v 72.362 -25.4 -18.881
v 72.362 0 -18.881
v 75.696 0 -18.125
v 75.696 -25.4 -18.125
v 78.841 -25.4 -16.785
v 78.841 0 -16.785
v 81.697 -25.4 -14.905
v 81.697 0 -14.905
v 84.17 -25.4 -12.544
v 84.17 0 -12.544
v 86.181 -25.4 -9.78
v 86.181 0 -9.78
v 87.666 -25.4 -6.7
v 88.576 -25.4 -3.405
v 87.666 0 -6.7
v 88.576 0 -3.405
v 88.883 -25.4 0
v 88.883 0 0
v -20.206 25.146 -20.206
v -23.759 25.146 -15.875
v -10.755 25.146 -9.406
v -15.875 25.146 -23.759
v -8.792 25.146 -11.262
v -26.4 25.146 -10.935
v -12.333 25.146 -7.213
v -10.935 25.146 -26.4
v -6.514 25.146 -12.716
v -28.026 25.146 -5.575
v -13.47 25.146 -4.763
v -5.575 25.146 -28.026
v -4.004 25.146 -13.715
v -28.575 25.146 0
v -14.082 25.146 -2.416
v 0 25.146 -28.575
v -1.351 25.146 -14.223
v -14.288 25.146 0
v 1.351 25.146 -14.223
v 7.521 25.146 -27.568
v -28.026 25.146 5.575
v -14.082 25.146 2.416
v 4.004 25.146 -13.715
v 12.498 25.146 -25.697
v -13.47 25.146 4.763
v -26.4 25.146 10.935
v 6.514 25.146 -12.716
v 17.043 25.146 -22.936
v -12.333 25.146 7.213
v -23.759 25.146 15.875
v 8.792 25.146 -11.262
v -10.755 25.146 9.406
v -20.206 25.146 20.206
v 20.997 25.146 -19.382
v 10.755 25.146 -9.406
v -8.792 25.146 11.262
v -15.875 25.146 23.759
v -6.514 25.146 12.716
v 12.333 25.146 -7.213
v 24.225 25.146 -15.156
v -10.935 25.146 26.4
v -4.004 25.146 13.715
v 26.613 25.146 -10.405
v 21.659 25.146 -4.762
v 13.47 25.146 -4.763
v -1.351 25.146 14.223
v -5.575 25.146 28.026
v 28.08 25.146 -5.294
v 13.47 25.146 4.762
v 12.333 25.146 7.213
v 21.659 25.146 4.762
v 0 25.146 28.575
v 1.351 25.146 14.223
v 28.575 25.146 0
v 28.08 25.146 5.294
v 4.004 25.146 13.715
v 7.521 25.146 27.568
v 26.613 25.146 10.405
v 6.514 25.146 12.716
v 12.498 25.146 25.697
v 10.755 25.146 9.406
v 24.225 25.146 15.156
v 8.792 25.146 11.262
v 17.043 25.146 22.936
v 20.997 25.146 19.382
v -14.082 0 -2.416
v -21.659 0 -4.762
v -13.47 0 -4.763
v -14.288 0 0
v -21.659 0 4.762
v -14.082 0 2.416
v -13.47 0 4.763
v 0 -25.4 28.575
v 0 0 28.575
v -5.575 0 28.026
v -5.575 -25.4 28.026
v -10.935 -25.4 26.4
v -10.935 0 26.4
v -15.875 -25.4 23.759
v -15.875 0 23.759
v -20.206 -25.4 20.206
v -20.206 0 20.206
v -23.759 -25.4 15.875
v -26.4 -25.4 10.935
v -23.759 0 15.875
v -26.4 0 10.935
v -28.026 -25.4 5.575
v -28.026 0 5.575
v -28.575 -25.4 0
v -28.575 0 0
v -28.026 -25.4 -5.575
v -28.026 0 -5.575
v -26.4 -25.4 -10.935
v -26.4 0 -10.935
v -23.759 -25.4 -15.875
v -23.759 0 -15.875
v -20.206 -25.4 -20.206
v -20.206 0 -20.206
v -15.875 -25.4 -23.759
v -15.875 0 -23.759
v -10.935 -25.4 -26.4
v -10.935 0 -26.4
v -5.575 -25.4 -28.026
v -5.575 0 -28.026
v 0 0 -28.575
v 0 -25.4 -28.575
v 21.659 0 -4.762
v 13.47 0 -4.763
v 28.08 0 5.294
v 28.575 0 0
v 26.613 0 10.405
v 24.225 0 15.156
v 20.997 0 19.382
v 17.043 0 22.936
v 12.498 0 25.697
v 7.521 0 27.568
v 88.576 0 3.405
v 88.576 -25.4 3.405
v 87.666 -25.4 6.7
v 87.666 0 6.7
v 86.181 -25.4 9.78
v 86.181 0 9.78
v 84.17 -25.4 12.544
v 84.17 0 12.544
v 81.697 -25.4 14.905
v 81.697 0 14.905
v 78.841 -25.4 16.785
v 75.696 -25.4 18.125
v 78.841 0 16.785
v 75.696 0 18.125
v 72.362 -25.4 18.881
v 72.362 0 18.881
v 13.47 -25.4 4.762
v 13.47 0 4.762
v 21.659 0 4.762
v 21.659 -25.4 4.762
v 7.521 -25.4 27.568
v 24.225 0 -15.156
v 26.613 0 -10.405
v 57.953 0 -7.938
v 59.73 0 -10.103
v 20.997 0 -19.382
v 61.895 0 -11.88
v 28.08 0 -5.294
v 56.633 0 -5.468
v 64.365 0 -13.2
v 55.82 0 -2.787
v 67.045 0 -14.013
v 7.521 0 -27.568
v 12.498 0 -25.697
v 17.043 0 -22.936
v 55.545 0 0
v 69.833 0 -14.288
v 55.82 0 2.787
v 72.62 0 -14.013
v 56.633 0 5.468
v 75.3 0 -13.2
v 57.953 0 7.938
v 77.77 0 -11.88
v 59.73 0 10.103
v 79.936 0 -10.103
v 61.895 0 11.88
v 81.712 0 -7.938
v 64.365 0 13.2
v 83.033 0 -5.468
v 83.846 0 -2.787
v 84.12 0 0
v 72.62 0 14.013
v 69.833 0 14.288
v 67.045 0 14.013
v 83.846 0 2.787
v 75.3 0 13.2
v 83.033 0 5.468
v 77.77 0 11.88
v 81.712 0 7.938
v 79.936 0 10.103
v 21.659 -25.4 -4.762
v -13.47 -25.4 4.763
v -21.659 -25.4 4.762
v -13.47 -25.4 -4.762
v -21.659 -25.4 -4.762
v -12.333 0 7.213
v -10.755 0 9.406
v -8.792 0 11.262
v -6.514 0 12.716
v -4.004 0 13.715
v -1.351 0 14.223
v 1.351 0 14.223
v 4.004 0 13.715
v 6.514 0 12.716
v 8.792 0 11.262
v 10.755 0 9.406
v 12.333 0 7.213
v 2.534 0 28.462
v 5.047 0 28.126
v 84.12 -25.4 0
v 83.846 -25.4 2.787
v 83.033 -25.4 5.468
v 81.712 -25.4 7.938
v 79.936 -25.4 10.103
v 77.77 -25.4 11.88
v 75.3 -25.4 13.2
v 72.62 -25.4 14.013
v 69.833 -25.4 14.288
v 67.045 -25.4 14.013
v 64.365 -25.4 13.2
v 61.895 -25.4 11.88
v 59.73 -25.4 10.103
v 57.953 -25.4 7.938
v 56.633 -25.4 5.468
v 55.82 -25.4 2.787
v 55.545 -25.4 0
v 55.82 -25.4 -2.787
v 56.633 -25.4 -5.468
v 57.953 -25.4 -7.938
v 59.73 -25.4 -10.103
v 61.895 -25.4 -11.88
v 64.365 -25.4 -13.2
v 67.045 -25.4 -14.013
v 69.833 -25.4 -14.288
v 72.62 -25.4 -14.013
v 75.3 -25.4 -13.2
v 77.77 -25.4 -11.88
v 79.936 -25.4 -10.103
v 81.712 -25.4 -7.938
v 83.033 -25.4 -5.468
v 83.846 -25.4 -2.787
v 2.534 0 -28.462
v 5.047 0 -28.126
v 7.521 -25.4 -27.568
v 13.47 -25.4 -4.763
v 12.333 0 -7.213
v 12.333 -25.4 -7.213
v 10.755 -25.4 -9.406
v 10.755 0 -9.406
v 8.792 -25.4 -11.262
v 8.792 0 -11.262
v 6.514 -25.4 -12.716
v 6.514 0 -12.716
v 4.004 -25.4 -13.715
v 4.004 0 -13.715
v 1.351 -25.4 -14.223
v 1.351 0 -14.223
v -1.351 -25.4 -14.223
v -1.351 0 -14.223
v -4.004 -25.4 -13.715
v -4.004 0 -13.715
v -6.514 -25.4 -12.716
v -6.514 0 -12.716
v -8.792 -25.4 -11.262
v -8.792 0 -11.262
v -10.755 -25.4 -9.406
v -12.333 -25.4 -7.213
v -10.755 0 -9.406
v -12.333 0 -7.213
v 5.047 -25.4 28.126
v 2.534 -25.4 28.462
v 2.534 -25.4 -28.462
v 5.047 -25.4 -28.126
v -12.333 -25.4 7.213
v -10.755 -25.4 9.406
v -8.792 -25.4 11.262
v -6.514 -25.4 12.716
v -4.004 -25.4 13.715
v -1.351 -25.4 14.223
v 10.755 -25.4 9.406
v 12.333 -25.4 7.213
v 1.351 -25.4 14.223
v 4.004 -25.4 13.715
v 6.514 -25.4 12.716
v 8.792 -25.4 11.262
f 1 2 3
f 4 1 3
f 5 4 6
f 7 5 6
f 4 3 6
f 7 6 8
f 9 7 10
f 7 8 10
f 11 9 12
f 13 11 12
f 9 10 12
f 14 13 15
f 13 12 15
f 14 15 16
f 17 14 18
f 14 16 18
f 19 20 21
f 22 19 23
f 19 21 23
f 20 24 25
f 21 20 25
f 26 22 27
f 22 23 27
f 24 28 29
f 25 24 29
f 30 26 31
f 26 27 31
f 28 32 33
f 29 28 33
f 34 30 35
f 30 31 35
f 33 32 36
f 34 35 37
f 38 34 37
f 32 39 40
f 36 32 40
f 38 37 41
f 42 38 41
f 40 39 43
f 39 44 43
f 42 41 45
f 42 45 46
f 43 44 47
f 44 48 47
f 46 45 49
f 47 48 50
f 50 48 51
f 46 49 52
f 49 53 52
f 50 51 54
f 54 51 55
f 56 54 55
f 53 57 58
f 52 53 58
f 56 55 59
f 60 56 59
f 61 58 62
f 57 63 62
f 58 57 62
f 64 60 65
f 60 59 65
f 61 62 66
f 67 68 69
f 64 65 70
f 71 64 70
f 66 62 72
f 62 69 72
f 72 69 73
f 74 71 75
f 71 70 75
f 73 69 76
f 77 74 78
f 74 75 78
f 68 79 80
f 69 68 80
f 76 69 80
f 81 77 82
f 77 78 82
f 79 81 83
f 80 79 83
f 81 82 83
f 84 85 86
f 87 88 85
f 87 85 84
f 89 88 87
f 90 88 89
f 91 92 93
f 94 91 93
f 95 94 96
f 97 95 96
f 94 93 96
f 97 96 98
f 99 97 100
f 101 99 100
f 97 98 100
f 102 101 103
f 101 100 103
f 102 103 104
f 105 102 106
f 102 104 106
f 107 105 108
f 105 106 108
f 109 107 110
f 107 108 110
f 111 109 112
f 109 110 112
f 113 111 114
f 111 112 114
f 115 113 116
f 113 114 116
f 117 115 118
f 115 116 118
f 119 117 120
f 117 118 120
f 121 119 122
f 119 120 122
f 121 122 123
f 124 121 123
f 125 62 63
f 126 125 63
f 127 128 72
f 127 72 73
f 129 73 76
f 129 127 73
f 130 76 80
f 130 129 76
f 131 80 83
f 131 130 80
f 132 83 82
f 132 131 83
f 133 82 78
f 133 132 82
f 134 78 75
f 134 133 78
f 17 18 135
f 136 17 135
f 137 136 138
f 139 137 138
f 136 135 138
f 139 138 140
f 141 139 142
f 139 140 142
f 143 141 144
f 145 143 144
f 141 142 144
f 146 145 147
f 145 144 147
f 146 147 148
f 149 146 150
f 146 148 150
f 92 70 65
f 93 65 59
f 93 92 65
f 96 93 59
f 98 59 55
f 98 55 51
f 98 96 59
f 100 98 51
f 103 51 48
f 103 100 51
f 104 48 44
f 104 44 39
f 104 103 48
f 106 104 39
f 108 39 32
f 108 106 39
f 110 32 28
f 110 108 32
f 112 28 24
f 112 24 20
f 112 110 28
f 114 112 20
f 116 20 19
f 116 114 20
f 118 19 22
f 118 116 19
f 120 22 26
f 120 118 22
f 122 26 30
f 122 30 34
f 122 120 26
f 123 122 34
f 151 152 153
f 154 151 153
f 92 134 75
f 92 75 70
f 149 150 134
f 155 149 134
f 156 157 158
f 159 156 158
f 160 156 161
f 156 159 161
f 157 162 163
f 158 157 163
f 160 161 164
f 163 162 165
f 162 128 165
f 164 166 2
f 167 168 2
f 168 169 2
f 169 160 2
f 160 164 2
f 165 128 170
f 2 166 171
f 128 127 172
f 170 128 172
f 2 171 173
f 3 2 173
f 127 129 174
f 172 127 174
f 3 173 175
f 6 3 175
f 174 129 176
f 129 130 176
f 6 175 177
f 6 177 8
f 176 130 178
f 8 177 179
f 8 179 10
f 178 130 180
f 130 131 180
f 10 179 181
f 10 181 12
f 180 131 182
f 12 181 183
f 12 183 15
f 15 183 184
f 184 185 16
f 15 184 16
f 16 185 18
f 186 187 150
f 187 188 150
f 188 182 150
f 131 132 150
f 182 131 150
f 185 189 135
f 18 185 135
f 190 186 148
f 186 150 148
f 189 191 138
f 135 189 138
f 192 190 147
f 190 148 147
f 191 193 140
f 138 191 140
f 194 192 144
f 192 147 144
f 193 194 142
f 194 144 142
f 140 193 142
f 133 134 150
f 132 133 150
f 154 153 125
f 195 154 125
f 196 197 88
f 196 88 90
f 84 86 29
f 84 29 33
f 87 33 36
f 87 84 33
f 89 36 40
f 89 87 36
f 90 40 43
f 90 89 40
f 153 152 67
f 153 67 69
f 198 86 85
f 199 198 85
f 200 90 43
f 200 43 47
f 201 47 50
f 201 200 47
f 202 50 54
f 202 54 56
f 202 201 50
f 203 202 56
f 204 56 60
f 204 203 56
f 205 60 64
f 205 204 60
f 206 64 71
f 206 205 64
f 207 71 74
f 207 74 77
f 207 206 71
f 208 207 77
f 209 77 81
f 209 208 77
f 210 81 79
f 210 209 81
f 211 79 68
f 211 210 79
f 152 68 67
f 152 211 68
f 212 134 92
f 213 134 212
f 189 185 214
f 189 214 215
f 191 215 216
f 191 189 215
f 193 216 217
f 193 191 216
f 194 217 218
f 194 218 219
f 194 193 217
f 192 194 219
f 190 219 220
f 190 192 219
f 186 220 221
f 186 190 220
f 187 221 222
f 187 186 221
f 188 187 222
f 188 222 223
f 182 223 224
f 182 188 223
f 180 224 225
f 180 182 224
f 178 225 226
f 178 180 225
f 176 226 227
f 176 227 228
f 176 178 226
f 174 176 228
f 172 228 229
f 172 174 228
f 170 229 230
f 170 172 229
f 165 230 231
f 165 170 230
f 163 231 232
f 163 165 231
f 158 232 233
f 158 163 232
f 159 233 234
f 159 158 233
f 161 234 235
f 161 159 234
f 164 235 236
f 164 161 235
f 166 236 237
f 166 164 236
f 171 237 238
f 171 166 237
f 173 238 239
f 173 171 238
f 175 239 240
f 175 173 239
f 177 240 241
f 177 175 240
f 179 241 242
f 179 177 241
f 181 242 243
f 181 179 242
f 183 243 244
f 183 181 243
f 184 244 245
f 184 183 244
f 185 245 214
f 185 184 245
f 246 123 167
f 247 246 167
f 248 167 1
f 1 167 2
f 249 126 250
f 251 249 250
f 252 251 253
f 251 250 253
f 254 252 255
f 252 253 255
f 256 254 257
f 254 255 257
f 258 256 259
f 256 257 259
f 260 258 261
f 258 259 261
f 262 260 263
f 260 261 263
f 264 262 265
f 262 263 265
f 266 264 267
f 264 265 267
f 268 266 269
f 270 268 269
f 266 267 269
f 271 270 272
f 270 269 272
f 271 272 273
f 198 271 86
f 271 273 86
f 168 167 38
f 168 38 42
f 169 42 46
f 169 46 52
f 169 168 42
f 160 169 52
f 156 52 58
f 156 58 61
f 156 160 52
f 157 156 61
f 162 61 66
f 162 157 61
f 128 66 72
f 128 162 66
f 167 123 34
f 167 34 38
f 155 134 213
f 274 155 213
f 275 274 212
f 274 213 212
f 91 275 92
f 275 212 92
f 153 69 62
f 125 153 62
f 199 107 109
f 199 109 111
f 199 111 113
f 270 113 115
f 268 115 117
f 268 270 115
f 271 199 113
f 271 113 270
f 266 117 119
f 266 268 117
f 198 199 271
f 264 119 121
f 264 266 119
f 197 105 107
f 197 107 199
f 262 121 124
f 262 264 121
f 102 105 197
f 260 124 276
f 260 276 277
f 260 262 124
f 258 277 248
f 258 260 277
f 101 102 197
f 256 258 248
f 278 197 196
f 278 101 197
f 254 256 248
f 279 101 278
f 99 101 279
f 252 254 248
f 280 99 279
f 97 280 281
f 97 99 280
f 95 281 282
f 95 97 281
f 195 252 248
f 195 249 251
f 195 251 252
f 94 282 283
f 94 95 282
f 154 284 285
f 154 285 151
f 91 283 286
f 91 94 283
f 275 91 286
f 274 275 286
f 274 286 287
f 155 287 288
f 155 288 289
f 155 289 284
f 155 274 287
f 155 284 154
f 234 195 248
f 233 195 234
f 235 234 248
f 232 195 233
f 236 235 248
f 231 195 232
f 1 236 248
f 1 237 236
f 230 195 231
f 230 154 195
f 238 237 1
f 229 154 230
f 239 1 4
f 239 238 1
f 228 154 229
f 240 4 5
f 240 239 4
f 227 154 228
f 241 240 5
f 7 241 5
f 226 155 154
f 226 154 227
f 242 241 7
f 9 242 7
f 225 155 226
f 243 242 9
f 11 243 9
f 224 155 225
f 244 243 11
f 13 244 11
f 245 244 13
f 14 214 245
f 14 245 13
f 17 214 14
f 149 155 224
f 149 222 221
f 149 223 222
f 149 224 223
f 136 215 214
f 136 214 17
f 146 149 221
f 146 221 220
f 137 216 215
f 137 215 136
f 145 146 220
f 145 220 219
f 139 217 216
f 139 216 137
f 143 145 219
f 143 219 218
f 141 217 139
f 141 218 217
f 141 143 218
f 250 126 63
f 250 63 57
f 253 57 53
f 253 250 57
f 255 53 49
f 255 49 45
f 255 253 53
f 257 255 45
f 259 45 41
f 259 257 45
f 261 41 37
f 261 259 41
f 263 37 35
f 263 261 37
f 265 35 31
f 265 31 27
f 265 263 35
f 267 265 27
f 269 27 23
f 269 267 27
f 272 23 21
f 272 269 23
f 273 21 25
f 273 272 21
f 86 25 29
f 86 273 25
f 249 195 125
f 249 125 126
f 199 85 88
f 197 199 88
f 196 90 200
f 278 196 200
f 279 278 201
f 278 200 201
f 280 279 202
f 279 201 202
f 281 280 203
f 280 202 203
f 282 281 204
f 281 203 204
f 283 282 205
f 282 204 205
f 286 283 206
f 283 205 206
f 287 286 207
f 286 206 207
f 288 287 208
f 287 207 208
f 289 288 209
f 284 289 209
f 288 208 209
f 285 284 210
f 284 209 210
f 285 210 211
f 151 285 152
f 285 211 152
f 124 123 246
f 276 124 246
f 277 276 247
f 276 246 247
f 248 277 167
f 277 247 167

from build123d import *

# Parameters (mm, degrees)
F0_R     = 14.2875
F1_DEPTH = 25.4
F2_DEPTH = 25.146


with BuildPart() as f1:
    # F0 (on Front) → F1 (new body)
    with BuildSketch(Plane.XZ):
        with BuildLine():
            ThreePointArc((7.5208737148, 27.5675004954), (3.7940280931, 28.322005152), (0, 28.575))
            Line((0, 28.575), (7.5208737148, 27.5675004954))
        make_face()
        with BuildLine():
            Line((7.5208737148, -27.5675004954), (0, -28.575))
            ThreePointArc((0, -28.575), (3.7940280931, -28.322005152), (7.5208737148, -27.5675004954))
        make_face()
        with BuildLine():
            Line((72.3621368264, 18.881336768), (7.5208737148, 27.5675004954))
            ThreePointArc((7.5208737148, 27.5675004954), (22.7094648924, 17.3438989071), (28.575, 0))
            ThreePointArc((28.575, 0), (22.7094648924, -17.3438989071), (7.5208737148, -27.5675004954))
            Line((7.5208737148, -27.5675004954), (72.3621368264, -18.881336768))
            ThreePointArc((72.3621368264, -18.881336768), (50.7827847643, 0), (72.3621368264, 18.881336768))
        make_face()
        with BuildLine():
            ThreePointArc((88.8827847643, 0), (84.1695671227, 12.5442884058), (72.3621368264, 18.881336768))
            ThreePointArc((72.3621368264, 18.881336768), (50.7827847643, 0), (72.3621368264, -18.881336768))
            ThreePointArc((72.3621368264, -18.881336768), (84.1695671227, -12.5442884058), (88.8827847643, 0))
        make_face()
        with Locations((69.8327847643, 0)):
            Circle(F0_R, mode=Mode.SUBTRACT)
        with BuildLine():
            Line((7.5208737148, 27.5675004954), (0, 28.575))
            ThreePointArc((0, 28.575), (-28.575, 0), (0, -28.575))
            Line((0, -28.575), (7.5208737148, -27.5675004954))
            ThreePointArc((7.5208737148, -27.5675004954), (22.7094648924, -17.3438989071), (28.575, 0))
            ThreePointArc((28.575, 0), (22.7094648924, 17.3438989071), (7.5208737148, 27.5675004954))
        make_face()
        with BuildLine():
            ThreePointArc((-13.4703841816, 4.7625), (0, 14.2875), (13.4703841816, 4.7625))
            Line((13.4703841816, 4.7625), (21.6587726027, 4.7625))
            Line((21.6587726027, 4.7625), (21.6587726027, -4.7625))
            Line((21.6587726027, -4.7625), (13.4703841816, -4.7625))
            ThreePointArc((13.4703841816, -4.7625), (0, -14.2875), (-13.4703841816, -4.7625))
            Line((-13.4703841816, -4.7625), (-21.6587726027, -4.7625))
            Line((-21.6587726027, -4.7625), (-21.6587726027, 4.7625))
            Line((-21.6587726027, 4.7625), (-13.4703841816, 4.7625))
        make_face(mode=Mode.SUBTRACT)
    extrude(amount=F1_DEPTH)

    # F0 (on Front) → F2 (join)
    with BuildSketch(Plane.XZ):
        with BuildLine():
            Line((7.5208737148, 27.5675004954), (0, 28.575))
            ThreePointArc((0, 28.575), (-28.575, 0), (0, -28.575))
            Line((0, -28.575), (7.5208737148, -27.5675004954))
            ThreePointArc((7.5208737148, -27.5675004954), (22.7094648924, -17.3438989071), (28.575, 0))
            ThreePointArc((28.575, 0), (22.7094648924, 17.3438989071), (7.5208737148, 27.5675004954))
        make_face()
        with BuildLine():
            ThreePointArc((-13.4703841816, 4.7625), (0, 14.2875), (13.4703841816, 4.7625))
            Line((13.4703841816, 4.7625), (21.6587726027, 4.7625))
            Line((21.6587726027, 4.7625), (21.6587726027, -4.7625))
            Line((21.6587726027, -4.7625), (13.4703841816, -4.7625))
            ThreePointArc((13.4703841816, -4.7625), (0, -14.2875), (-13.4703841816, -4.7625))
            Line((-13.4703841816, -4.7625), (-21.6587726027, -4.7625))
            Line((-21.6587726027, -4.7625), (-21.6587726027, 4.7625))
            Line((-21.6587726027, 4.7625), (-13.4703841816, 4.7625))
        make_face(mode=Mode.SUBTRACT)
        with BuildLine():
            ThreePointArc((-13.4703841816, -4.7625), (-14.2875, 0), (-13.4703841816, 4.7625))
            Line((-13.4703841816, 4.7625), (-21.6587726027, 4.7625))
            Line((-21.6587726027, 4.7625), (-21.6587726027, -4.7625))
            Line((-21.6587726027, -4.7625), (-13.4703841816, -4.7625))
        make_face()
    extrude(amount=-F2_DEPTH)


solid = f1.part
